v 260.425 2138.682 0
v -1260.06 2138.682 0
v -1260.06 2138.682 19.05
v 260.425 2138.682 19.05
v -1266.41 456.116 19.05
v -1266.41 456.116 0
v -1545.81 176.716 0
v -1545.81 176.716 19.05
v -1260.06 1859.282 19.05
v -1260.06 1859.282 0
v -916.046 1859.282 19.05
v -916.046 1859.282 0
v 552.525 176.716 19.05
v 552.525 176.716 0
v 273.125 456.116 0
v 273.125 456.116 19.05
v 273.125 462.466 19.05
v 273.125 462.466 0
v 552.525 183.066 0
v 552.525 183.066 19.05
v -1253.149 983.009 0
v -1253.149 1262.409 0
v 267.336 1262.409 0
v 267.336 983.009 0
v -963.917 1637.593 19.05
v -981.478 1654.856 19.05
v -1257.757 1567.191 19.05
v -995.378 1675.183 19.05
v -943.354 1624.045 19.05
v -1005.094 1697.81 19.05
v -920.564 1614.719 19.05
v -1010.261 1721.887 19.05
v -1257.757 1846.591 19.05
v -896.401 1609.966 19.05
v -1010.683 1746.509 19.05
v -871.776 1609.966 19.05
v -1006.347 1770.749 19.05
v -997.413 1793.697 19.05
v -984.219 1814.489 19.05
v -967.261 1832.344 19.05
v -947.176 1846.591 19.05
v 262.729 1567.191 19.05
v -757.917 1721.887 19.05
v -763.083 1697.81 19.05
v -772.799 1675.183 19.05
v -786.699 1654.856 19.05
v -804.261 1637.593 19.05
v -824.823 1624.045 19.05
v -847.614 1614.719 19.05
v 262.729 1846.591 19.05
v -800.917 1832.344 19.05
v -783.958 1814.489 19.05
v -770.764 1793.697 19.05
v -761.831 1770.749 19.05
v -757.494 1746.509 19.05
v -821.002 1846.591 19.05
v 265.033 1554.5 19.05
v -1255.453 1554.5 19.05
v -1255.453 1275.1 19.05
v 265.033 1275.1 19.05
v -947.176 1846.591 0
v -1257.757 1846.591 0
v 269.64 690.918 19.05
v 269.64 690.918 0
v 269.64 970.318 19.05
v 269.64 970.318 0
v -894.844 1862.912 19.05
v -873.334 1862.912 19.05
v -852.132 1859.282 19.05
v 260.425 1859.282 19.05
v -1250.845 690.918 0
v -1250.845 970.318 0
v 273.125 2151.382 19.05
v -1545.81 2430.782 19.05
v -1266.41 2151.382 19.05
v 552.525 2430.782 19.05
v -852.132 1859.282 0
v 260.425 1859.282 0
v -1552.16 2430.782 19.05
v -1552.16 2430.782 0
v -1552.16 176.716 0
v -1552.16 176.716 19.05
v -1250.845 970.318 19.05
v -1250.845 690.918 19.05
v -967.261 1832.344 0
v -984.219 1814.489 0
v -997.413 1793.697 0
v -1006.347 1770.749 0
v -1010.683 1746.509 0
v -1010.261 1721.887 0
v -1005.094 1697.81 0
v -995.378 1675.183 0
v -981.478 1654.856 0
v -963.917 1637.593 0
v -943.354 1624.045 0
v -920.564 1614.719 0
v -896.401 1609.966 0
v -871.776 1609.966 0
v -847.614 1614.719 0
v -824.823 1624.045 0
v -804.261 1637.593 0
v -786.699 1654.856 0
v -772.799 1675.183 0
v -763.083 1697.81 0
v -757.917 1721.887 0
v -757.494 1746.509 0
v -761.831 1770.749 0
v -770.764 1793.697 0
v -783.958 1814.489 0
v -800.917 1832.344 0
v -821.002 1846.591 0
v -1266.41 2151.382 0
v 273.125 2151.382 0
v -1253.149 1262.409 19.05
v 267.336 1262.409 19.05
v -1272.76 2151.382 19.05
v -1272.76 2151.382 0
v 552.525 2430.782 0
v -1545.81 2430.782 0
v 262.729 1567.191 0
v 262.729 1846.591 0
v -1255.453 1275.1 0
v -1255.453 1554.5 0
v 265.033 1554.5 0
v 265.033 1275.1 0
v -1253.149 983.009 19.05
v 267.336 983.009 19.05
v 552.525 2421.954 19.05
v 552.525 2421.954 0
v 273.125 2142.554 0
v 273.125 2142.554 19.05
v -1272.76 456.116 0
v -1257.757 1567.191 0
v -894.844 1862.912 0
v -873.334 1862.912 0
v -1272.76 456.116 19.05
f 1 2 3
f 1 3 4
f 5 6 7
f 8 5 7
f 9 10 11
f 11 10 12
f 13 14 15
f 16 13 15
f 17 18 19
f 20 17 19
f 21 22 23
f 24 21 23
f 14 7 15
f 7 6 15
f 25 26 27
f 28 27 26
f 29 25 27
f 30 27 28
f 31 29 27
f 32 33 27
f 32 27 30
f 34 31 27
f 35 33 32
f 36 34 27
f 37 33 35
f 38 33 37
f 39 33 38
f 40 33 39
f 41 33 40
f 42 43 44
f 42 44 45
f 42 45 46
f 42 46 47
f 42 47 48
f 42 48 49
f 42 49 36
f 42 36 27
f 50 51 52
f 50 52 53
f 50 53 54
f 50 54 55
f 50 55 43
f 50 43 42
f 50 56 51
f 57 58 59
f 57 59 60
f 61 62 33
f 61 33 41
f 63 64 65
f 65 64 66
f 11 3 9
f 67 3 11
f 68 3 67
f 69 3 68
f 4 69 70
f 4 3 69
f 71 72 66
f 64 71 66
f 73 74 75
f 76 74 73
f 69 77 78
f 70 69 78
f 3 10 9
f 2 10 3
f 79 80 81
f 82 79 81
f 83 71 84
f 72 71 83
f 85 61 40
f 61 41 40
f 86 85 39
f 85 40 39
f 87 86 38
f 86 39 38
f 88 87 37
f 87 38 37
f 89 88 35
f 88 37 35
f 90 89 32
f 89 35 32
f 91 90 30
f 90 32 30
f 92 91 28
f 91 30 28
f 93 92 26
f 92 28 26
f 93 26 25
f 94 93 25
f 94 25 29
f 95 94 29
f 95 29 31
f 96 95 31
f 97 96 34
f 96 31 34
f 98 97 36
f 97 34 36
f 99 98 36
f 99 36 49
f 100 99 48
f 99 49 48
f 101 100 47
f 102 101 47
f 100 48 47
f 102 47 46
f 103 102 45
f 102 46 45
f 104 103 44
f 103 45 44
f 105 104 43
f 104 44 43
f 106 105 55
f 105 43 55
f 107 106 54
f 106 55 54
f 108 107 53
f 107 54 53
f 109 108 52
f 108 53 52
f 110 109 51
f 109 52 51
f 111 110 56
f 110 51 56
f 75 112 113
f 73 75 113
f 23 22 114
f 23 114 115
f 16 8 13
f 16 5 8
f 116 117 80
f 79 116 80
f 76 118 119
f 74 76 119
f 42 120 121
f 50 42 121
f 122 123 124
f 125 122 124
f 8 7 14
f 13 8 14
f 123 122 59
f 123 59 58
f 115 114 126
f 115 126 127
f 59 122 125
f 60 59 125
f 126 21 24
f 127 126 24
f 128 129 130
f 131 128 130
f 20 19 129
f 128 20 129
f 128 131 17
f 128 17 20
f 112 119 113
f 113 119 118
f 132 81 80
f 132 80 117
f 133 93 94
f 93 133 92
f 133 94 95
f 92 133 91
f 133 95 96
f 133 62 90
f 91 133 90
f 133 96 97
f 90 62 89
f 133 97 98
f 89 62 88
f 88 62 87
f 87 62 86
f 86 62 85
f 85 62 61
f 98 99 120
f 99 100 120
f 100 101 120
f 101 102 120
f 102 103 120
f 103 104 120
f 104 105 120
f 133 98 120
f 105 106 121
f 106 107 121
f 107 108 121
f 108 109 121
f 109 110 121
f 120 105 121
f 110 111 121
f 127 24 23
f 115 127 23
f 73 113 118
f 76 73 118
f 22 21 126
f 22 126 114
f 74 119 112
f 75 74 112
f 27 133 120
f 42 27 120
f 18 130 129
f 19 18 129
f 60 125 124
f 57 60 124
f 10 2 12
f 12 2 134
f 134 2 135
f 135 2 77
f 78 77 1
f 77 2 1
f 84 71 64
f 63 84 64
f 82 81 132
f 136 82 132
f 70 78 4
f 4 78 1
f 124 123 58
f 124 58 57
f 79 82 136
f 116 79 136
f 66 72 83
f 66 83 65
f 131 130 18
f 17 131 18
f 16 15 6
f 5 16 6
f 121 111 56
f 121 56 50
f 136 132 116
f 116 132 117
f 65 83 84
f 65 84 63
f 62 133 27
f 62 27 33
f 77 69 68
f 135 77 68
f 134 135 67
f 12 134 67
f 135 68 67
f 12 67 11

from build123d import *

# Parameters (mm, degrees)
F1_DEPTH      = 19.05
F0_W          = 1520.485255909
F0_H          = 279.4
F2_R          = 127
F3_DEPTH      = 19.051
F3_DEPTH_BACK = 4532


# Not quite as in the source:
# - an extrude ends at something that could not be found from the text; its depth is read off the source's solid


with BuildPart() as f1:
    # F0 (on Top) → F1 (new body)
    with BuildSketch(Plane.XY):
        Polygon((-1552.1603912354, 2430.7818412781), (-1552.1603912354, 176.7163574696), (-1272.7603912354, 456.1163574696), (-1272.7603912354, 2151.3818412781), align=None)
    extrude(amount=F1_DEPTH)


with BuildPart() as f1b:
    # F0 (on Top) → F1, piece 2 (new body)
    with BuildSketch(Plane.XY):
        Polygon((-1545.8103912354, 176.7163574696), (552.5248646736, 176.7163574696), (273.1248646736, 456.1163574696), (-1266.4103912354, 456.1163574696), align=None)
    extrude(amount=F1_DEPTH)


with BuildPart() as f1c:
    # F0 (on Top) → F1, piece 3 (new body)
    with BuildSketch(Plane.XY):
        Polygon((552.5248646736, 2430.7818412781), (-1545.8103912354, 2430.7818412781), (-1266.4103912354, 2151.3818412781), (273.1248646736, 2151.3818412781), align=None)
    extrude(amount=F1_DEPTH)


with BuildPart() as f1d:
    # F0 (on Top) → F1, piece 4 (new body)
    with BuildSketch(Plane.XY):
        Polygon((552.5248646736, 183.0663574696), (552.5248646736, 2421.9541702463), (273.1248646736, 2142.5541702463), (273.1248646736, 462.4663574696), align=None)
    extrude(amount=F1_DEPTH)


with BuildPart() as f1e:
    # F0 (on Top) → F1, piece 5 (new body)
    with BuildSketch(Plane.XY):
        with Locations((-499.8177632809, 1998.9818412781)):
            Rectangle(F0_W, F0_H)
    extrude(amount=F1_DEPTH)


with BuildPart() as f1f:
    # F0 (on Top) → F1, piece 6 (new body)
    with BuildSketch(Plane.XY):
        with Locations((-497.513896589, 1706.8909270095)):
            Rectangle(F0_W, F0_H)
    extrude(amount=F1_DEPTH)


with BuildPart() as f1g:
    # F0 (on Top) → F1, piece 7 (new body)
    with BuildSketch(Plane.XY):
        with Locations((-495.2100298971, 1414.8000127409)):
            Rectangle(F0_W, F0_H)
    extrude(amount=F1_DEPTH)


with BuildPart() as f1h:
    # F0 (on Top) → F1, piece 8 (new body)
    with BuildSketch(Plane.XY):
        with Locations((-492.9061632052, 1122.7090984723)):
            Rectangle(F0_W, F0_H)
    extrude(amount=F1_DEPTH)


with BuildPart() as f1i:
    # F0 (on Top) → F1, piece 9 (new body)
    with BuildSketch(Plane.XY):
        with Locations((-490.6022965133, 830.6181842037)):
            Rectangle(F0_W, F0_H)
    extrude(amount=F1_DEPTH)


with BuildPart() as f3_tool:
    # F2 (on Top) → F3 (new body, two sides)
    with BuildSketch(Plane.XY) as f3_sk:
        with Locations((-884.0888142586, 1736.3681793213)):
            Circle(F2_R)
    extrude(amount=F3_DEPTH)
    extrude(f3_sk.sketch, amount=-F3_DEPTH_BACK)


with BuildPart() as f1e_1:
    add(f1e.part)

    # F3: cut by f3_tool
    add(f3_tool.part, mode=Mode.SUBTRACT)


with BuildPart() as f1f_1:
    add(f1f.part)

    # F3: cut by f3_tool
    add(f3_tool.part, mode=Mode.SUBTRACT)


solid = Compound([f1.part, f1b.part, f1c.part, f1d.part, f1g.part, f1h.part, f1i.part, f1e_1.part, f1f_1.part])
